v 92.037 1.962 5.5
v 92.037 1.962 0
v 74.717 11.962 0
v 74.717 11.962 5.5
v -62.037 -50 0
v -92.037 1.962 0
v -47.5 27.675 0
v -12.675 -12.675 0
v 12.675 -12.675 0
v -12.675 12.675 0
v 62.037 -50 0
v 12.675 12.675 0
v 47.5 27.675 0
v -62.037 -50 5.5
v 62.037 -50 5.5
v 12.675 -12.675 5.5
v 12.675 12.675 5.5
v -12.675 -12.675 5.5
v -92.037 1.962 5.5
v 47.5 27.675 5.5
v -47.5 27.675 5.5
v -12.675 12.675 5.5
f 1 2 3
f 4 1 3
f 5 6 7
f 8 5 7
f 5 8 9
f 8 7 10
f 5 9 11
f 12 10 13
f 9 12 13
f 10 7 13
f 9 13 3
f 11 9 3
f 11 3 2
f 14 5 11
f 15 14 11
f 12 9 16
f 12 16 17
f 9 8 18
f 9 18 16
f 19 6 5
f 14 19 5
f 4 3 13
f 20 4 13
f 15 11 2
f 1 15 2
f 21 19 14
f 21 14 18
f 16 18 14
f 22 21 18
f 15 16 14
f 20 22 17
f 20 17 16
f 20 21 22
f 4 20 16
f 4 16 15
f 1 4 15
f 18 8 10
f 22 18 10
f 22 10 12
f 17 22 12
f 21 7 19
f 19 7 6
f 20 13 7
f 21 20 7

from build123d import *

# Parameters (mm, degrees)
F0_W     = 25.35
F0_H     = 25.35
F1_DEPTH = 5.5


with BuildPart() as f1:
    # F0 (on Top) → F1 (new body)
    with BuildSketch(Plane.XY):
        Polygon((47.5, 27.675), (-47.5, 27.675), (-92.037046, 1.961524), (-62.037046, -50), (62.037046, -50), (92.037046, 1.961524), (74.716538, 11.961524), align=None)
        Rectangle(F0_W, F0_H, mode=Mode.SUBTRACT)
    extrude(amount=F1_DEPTH)


solid = f1.part
